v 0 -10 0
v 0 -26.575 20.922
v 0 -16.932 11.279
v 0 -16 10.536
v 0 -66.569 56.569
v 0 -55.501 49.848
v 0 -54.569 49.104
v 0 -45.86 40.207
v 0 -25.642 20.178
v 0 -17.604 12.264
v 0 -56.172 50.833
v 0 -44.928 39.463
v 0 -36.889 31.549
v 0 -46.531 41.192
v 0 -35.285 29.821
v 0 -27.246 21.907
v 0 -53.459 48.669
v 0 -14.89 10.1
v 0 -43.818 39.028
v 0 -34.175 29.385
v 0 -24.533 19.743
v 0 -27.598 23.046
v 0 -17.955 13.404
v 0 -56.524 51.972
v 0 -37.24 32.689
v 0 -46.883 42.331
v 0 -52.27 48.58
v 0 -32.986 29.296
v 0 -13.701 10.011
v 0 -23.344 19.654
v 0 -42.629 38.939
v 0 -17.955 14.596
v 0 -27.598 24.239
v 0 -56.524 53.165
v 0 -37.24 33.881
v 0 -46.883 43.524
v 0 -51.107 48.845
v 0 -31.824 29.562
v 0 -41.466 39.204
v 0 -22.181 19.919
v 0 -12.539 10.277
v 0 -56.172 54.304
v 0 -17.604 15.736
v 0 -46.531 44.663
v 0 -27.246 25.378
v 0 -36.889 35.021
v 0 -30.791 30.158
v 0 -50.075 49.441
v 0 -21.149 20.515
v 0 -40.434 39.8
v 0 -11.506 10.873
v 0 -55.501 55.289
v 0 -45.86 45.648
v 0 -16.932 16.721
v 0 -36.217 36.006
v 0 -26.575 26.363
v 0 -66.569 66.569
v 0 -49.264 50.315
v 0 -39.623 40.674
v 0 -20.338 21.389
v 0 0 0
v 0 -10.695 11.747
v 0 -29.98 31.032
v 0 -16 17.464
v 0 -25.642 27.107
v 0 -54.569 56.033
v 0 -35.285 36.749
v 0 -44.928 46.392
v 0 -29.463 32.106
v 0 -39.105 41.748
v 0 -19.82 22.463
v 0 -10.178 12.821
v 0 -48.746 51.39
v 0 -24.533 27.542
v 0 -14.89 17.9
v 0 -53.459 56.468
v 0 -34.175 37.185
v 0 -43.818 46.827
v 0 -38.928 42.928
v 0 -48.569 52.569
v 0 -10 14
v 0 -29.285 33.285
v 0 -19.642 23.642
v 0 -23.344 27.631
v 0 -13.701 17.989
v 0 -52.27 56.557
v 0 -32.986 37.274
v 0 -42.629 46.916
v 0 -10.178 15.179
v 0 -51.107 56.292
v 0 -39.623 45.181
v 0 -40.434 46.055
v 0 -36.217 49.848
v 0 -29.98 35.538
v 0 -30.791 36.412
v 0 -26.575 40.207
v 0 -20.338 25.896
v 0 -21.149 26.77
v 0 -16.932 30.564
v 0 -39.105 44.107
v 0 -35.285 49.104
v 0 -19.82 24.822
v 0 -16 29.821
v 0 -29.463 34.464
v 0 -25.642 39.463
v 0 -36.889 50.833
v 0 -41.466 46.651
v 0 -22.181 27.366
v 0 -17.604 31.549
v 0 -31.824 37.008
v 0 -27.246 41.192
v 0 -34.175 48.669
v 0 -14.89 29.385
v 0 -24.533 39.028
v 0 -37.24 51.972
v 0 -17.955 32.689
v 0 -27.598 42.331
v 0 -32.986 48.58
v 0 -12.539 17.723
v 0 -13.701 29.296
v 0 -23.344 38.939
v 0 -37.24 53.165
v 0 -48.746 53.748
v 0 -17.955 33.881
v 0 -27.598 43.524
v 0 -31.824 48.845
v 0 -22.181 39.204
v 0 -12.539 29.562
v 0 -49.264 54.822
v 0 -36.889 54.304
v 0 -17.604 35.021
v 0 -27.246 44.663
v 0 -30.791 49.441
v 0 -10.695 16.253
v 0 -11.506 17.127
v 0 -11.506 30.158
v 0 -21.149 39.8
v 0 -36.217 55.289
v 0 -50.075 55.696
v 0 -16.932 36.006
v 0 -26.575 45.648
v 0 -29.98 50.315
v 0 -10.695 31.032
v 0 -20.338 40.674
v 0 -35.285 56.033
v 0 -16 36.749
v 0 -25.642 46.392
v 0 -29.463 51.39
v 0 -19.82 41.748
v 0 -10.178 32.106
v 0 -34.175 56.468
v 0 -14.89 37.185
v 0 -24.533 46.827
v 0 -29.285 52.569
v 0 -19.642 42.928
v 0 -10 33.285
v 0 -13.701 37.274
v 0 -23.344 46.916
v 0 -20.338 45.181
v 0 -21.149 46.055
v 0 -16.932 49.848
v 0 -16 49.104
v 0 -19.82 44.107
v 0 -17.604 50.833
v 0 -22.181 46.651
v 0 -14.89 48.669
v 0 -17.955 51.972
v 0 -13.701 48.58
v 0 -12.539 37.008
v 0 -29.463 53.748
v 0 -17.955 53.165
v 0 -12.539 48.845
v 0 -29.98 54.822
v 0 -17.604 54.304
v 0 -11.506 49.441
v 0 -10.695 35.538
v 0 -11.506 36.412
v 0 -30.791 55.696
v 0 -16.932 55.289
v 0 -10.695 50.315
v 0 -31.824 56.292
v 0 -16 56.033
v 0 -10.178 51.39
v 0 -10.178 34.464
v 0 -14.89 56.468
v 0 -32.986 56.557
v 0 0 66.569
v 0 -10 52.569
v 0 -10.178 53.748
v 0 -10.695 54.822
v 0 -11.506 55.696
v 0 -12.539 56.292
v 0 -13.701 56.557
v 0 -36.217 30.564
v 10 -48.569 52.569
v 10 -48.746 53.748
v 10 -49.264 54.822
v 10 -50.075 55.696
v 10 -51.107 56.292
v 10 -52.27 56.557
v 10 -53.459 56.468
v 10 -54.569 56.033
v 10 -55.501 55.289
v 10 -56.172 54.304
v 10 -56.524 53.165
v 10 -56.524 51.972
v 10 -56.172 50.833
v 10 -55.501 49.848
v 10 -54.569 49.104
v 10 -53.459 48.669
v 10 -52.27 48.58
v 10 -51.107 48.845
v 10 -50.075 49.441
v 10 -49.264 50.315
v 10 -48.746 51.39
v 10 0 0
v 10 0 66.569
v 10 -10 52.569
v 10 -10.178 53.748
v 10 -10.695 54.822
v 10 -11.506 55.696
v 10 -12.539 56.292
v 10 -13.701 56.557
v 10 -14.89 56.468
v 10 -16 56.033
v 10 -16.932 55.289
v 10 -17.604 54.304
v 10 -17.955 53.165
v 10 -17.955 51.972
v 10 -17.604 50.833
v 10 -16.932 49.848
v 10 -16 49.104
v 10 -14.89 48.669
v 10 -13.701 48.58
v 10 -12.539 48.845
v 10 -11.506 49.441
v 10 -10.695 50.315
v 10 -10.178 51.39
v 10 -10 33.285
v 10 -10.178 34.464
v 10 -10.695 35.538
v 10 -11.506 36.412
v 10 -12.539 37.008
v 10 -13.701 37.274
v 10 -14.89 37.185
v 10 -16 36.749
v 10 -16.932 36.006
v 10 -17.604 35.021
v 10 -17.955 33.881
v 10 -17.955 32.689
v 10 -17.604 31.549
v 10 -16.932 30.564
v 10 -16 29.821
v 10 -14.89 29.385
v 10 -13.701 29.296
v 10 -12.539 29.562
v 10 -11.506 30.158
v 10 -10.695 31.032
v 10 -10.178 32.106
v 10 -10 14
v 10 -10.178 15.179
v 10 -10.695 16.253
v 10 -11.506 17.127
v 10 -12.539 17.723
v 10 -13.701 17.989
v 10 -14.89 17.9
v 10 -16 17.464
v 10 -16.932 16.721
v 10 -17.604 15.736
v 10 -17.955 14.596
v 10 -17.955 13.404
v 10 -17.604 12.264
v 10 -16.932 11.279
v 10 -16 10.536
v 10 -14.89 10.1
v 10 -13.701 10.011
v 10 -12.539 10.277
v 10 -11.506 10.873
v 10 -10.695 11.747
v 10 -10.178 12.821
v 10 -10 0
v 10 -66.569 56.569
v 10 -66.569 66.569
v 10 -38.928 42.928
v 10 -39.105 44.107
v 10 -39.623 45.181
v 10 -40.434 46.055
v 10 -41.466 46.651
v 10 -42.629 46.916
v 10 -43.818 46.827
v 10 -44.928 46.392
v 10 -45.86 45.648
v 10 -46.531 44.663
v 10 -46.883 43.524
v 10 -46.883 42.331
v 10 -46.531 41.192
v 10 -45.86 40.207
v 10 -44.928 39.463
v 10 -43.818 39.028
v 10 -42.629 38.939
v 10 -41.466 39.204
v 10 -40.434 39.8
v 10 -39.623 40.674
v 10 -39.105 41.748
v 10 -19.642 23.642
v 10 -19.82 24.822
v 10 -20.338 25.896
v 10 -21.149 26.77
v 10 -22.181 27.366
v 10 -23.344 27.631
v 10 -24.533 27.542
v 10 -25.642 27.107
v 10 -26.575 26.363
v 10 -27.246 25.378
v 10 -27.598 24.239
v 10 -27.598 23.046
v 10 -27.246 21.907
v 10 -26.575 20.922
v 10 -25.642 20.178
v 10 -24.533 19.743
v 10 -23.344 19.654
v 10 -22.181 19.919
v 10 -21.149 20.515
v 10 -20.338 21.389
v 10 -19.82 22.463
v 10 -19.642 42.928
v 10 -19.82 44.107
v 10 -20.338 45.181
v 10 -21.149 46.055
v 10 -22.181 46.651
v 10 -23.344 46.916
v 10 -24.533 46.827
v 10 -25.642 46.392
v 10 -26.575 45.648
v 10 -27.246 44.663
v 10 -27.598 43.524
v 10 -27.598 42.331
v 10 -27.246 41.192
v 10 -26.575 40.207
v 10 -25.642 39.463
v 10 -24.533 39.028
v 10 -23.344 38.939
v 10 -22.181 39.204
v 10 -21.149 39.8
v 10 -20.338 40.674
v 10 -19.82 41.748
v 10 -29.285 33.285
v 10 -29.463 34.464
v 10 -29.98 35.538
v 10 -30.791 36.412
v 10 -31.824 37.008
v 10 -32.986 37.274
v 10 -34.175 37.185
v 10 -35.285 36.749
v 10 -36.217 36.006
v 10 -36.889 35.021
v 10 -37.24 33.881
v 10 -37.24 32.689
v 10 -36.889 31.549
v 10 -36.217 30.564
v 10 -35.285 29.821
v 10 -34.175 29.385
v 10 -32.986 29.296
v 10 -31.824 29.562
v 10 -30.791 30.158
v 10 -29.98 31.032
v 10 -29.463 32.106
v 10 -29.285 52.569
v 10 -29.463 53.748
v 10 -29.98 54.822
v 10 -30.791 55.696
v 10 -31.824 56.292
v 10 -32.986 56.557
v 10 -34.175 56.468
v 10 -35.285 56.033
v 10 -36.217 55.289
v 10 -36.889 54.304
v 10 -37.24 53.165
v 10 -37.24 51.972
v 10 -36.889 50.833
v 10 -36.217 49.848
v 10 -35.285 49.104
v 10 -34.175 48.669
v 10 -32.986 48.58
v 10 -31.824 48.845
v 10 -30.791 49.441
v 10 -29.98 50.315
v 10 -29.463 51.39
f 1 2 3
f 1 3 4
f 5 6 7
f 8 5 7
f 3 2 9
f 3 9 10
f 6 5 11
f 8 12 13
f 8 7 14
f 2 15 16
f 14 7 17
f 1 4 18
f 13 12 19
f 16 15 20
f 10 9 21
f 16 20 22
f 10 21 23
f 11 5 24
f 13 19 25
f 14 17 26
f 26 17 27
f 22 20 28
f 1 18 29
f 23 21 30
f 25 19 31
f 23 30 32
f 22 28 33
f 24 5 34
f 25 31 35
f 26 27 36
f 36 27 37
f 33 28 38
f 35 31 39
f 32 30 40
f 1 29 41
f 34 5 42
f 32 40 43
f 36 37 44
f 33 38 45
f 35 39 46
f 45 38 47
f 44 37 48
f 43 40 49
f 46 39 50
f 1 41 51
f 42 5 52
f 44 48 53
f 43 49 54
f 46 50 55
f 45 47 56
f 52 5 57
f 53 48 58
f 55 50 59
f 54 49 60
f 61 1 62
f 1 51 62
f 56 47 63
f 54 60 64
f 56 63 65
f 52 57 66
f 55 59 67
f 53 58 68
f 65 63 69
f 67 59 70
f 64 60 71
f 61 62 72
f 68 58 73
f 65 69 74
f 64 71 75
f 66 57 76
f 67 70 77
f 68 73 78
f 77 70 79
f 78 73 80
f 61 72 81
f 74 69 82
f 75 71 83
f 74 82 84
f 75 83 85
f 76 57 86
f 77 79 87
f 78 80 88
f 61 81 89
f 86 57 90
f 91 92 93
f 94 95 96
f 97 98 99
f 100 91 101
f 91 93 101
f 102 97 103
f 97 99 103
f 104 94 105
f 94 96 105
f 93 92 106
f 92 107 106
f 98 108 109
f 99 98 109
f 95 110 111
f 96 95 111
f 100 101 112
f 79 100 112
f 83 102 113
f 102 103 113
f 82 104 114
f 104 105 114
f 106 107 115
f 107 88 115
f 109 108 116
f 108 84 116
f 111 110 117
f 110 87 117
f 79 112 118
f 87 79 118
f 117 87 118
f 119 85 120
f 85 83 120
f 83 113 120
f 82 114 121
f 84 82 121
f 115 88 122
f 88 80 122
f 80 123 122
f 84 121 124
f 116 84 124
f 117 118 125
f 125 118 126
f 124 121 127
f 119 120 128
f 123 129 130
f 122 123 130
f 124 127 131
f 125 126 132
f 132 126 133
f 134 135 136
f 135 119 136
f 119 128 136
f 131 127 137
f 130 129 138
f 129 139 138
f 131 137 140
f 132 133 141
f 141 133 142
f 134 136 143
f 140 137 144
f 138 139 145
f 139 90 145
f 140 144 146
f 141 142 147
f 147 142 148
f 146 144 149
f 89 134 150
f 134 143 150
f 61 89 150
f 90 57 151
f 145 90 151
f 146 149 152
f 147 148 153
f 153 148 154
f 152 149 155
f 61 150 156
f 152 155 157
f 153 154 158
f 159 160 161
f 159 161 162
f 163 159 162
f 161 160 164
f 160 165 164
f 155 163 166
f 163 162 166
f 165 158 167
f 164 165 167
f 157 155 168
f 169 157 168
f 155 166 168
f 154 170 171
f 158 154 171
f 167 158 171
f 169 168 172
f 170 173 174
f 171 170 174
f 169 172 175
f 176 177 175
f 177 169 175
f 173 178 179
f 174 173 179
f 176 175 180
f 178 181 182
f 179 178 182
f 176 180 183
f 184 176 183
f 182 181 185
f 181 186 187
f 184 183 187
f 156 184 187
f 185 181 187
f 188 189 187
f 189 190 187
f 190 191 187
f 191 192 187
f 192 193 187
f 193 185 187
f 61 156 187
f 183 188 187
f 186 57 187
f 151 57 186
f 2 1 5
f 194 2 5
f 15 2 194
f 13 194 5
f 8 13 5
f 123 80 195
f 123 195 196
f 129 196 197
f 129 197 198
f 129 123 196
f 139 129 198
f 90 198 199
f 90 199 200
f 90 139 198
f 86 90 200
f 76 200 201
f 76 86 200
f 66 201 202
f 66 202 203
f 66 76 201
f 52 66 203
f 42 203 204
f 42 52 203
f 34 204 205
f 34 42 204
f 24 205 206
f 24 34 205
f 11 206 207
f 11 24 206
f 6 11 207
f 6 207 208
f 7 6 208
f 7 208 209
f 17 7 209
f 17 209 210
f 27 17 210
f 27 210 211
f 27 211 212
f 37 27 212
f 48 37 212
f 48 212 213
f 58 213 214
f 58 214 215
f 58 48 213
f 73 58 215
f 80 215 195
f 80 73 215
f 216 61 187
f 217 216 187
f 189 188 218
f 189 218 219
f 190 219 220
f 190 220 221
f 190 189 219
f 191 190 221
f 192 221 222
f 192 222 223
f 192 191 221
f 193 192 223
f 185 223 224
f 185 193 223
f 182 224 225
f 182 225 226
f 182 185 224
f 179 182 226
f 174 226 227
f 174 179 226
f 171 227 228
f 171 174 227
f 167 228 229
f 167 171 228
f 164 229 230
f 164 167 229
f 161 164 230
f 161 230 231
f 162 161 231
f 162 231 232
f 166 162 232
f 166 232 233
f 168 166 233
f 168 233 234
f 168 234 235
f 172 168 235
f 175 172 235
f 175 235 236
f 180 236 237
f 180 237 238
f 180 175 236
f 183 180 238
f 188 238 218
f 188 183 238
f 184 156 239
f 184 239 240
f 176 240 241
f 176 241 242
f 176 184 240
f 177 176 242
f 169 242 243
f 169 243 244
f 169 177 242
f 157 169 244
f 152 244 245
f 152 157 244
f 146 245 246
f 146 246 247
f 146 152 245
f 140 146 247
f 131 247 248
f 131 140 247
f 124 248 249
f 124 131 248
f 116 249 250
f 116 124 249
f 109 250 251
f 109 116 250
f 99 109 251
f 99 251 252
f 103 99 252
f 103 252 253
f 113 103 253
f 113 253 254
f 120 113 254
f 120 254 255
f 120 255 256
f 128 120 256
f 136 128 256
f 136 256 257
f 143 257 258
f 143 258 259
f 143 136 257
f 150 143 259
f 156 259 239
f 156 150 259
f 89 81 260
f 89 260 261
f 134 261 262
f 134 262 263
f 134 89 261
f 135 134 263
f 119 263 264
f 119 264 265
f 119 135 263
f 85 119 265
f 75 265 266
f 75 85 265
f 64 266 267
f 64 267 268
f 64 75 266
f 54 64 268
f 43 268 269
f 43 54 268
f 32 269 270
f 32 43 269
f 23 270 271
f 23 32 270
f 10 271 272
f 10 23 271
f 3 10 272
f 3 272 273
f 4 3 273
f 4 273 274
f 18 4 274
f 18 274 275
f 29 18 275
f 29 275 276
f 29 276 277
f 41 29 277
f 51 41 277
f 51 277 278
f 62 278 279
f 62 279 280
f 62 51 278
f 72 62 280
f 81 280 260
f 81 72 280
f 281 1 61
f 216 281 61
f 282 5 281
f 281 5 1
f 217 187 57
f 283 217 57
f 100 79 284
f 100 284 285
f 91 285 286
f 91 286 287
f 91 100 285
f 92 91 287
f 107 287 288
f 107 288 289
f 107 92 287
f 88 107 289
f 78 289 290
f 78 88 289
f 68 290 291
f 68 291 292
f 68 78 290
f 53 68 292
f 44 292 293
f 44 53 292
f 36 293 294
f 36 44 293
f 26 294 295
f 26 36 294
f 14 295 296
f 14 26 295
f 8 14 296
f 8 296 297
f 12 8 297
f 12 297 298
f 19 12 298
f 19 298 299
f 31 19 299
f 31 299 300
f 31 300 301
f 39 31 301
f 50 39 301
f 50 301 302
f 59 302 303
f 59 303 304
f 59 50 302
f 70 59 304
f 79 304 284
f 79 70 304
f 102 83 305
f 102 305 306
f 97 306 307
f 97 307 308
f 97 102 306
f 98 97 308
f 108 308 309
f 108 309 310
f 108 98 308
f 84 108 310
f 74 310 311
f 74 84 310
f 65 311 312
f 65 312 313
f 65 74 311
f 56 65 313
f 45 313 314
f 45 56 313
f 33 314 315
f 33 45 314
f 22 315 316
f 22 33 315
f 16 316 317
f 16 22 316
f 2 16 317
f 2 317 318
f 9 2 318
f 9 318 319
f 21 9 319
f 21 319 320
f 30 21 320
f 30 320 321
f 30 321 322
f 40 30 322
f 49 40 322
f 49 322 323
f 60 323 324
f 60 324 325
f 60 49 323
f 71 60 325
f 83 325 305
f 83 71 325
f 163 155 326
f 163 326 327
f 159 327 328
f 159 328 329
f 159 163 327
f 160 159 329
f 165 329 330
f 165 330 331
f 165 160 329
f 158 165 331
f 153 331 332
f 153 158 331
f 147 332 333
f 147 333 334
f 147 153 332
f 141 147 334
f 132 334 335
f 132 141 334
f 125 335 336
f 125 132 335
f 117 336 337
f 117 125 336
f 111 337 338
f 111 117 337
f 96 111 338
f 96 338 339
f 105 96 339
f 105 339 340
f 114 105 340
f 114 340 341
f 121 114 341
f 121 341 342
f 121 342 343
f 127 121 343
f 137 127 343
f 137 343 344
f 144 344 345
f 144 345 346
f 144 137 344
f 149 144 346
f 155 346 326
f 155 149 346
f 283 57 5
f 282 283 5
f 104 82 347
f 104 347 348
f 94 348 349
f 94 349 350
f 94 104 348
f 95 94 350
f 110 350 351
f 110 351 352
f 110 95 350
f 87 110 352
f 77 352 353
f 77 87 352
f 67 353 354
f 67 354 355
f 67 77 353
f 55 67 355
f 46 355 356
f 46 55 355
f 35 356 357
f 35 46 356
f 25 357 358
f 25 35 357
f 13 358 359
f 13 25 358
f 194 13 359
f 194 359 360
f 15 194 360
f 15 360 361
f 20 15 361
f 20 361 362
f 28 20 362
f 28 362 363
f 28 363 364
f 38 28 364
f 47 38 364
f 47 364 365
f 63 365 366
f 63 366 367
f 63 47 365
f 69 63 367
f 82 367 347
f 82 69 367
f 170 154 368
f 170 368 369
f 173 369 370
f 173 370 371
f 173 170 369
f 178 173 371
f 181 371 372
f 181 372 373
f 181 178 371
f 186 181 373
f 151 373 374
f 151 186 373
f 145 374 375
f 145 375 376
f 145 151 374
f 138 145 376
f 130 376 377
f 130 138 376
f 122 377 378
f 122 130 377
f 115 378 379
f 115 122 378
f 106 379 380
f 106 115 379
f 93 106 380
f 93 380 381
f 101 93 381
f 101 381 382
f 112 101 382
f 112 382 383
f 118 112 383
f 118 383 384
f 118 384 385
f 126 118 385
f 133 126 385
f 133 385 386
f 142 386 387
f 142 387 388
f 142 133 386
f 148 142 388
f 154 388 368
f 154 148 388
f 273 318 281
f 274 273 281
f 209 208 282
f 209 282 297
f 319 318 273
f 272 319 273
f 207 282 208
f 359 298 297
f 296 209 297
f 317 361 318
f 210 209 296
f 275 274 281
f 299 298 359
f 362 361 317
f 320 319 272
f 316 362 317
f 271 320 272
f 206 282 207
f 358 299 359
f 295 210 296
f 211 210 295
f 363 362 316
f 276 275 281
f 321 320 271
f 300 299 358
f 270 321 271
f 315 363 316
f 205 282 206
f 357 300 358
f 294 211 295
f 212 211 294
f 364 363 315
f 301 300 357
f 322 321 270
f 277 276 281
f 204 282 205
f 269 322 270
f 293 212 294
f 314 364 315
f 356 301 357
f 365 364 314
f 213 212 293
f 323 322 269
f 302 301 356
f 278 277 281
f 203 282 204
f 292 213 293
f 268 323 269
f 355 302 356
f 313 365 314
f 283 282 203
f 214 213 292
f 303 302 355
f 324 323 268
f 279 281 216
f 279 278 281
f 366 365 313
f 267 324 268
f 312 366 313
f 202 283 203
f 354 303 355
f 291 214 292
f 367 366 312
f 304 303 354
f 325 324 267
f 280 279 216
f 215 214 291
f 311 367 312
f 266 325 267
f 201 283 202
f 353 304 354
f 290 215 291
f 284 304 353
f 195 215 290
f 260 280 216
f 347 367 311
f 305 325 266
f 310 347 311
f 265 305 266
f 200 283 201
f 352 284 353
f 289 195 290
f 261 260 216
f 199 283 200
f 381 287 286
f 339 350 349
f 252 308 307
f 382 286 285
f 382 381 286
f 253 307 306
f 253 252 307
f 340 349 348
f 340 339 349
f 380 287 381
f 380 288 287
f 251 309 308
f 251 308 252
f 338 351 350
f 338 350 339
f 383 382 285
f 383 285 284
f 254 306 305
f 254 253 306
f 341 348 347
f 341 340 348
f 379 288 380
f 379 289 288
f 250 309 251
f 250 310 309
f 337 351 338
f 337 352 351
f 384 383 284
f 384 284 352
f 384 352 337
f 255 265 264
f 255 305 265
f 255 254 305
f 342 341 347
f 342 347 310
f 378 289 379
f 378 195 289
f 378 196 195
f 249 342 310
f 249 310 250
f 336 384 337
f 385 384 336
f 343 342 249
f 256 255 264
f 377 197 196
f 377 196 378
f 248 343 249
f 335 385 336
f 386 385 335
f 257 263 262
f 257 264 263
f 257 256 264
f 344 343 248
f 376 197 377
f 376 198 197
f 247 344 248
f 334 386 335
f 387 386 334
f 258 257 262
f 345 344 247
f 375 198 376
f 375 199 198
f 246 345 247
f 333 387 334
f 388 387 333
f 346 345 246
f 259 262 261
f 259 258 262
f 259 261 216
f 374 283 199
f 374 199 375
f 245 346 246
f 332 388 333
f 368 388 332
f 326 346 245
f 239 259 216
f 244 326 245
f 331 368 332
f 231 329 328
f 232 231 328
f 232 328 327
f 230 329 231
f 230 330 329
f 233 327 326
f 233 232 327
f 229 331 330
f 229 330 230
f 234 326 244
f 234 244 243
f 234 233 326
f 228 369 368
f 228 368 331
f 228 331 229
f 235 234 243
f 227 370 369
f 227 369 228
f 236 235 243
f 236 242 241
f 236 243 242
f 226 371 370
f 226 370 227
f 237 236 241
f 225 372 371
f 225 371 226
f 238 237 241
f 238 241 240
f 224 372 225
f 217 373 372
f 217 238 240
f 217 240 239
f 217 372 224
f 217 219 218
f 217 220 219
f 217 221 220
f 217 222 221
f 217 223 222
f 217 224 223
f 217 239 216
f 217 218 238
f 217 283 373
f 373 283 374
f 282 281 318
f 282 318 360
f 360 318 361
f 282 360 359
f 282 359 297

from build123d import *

# Parameters (mm, degrees)
SKETCH_R  = 4
PAD_DEPTH = 10


with BuildPart() as part:
    # Sketch → Pad (new body)
    with BuildSketch(Plane.YZ):
        Polygon((0, 0), (0, 66.568542), (-66.568542, 66.568542), (-66.568542, 56.568542), (-10, 0), align=None)
        with Locations((-14, 52.568542)):
            Circle(SKETCH_R, mode=Mode.SUBTRACT)
        with Locations((-52.568542, 52.568542)):
            Circle(SKETCH_R, mode=Mode.SUBTRACT)
        with Locations((-14, 14)):
            Circle(SKETCH_R, mode=Mode.SUBTRACT)
        with Locations((-33.285, 52.568542)):
            Circle(SKETCH_R, mode=Mode.SUBTRACT)
        with Locations((-14, 33.285)):
            Circle(SKETCH_R, mode=Mode.SUBTRACT)
        with Locations((-33.285, 33.285)):
            Circle(SKETCH_R, mode=Mode.SUBTRACT)
        with Locations((-42.9275, 42.9275)):
            Circle(SKETCH_R, mode=Mode.SUBTRACT)
        with Locations((-23.6425, 42.9275)):
            Circle(SKETCH_R, mode=Mode.SUBTRACT)
        with Locations((-23.6425, 23.6425)):
            Circle(SKETCH_R, mode=Mode.SUBTRACT)
    extrude(amount=PAD_DEPTH)


solid = part.part
